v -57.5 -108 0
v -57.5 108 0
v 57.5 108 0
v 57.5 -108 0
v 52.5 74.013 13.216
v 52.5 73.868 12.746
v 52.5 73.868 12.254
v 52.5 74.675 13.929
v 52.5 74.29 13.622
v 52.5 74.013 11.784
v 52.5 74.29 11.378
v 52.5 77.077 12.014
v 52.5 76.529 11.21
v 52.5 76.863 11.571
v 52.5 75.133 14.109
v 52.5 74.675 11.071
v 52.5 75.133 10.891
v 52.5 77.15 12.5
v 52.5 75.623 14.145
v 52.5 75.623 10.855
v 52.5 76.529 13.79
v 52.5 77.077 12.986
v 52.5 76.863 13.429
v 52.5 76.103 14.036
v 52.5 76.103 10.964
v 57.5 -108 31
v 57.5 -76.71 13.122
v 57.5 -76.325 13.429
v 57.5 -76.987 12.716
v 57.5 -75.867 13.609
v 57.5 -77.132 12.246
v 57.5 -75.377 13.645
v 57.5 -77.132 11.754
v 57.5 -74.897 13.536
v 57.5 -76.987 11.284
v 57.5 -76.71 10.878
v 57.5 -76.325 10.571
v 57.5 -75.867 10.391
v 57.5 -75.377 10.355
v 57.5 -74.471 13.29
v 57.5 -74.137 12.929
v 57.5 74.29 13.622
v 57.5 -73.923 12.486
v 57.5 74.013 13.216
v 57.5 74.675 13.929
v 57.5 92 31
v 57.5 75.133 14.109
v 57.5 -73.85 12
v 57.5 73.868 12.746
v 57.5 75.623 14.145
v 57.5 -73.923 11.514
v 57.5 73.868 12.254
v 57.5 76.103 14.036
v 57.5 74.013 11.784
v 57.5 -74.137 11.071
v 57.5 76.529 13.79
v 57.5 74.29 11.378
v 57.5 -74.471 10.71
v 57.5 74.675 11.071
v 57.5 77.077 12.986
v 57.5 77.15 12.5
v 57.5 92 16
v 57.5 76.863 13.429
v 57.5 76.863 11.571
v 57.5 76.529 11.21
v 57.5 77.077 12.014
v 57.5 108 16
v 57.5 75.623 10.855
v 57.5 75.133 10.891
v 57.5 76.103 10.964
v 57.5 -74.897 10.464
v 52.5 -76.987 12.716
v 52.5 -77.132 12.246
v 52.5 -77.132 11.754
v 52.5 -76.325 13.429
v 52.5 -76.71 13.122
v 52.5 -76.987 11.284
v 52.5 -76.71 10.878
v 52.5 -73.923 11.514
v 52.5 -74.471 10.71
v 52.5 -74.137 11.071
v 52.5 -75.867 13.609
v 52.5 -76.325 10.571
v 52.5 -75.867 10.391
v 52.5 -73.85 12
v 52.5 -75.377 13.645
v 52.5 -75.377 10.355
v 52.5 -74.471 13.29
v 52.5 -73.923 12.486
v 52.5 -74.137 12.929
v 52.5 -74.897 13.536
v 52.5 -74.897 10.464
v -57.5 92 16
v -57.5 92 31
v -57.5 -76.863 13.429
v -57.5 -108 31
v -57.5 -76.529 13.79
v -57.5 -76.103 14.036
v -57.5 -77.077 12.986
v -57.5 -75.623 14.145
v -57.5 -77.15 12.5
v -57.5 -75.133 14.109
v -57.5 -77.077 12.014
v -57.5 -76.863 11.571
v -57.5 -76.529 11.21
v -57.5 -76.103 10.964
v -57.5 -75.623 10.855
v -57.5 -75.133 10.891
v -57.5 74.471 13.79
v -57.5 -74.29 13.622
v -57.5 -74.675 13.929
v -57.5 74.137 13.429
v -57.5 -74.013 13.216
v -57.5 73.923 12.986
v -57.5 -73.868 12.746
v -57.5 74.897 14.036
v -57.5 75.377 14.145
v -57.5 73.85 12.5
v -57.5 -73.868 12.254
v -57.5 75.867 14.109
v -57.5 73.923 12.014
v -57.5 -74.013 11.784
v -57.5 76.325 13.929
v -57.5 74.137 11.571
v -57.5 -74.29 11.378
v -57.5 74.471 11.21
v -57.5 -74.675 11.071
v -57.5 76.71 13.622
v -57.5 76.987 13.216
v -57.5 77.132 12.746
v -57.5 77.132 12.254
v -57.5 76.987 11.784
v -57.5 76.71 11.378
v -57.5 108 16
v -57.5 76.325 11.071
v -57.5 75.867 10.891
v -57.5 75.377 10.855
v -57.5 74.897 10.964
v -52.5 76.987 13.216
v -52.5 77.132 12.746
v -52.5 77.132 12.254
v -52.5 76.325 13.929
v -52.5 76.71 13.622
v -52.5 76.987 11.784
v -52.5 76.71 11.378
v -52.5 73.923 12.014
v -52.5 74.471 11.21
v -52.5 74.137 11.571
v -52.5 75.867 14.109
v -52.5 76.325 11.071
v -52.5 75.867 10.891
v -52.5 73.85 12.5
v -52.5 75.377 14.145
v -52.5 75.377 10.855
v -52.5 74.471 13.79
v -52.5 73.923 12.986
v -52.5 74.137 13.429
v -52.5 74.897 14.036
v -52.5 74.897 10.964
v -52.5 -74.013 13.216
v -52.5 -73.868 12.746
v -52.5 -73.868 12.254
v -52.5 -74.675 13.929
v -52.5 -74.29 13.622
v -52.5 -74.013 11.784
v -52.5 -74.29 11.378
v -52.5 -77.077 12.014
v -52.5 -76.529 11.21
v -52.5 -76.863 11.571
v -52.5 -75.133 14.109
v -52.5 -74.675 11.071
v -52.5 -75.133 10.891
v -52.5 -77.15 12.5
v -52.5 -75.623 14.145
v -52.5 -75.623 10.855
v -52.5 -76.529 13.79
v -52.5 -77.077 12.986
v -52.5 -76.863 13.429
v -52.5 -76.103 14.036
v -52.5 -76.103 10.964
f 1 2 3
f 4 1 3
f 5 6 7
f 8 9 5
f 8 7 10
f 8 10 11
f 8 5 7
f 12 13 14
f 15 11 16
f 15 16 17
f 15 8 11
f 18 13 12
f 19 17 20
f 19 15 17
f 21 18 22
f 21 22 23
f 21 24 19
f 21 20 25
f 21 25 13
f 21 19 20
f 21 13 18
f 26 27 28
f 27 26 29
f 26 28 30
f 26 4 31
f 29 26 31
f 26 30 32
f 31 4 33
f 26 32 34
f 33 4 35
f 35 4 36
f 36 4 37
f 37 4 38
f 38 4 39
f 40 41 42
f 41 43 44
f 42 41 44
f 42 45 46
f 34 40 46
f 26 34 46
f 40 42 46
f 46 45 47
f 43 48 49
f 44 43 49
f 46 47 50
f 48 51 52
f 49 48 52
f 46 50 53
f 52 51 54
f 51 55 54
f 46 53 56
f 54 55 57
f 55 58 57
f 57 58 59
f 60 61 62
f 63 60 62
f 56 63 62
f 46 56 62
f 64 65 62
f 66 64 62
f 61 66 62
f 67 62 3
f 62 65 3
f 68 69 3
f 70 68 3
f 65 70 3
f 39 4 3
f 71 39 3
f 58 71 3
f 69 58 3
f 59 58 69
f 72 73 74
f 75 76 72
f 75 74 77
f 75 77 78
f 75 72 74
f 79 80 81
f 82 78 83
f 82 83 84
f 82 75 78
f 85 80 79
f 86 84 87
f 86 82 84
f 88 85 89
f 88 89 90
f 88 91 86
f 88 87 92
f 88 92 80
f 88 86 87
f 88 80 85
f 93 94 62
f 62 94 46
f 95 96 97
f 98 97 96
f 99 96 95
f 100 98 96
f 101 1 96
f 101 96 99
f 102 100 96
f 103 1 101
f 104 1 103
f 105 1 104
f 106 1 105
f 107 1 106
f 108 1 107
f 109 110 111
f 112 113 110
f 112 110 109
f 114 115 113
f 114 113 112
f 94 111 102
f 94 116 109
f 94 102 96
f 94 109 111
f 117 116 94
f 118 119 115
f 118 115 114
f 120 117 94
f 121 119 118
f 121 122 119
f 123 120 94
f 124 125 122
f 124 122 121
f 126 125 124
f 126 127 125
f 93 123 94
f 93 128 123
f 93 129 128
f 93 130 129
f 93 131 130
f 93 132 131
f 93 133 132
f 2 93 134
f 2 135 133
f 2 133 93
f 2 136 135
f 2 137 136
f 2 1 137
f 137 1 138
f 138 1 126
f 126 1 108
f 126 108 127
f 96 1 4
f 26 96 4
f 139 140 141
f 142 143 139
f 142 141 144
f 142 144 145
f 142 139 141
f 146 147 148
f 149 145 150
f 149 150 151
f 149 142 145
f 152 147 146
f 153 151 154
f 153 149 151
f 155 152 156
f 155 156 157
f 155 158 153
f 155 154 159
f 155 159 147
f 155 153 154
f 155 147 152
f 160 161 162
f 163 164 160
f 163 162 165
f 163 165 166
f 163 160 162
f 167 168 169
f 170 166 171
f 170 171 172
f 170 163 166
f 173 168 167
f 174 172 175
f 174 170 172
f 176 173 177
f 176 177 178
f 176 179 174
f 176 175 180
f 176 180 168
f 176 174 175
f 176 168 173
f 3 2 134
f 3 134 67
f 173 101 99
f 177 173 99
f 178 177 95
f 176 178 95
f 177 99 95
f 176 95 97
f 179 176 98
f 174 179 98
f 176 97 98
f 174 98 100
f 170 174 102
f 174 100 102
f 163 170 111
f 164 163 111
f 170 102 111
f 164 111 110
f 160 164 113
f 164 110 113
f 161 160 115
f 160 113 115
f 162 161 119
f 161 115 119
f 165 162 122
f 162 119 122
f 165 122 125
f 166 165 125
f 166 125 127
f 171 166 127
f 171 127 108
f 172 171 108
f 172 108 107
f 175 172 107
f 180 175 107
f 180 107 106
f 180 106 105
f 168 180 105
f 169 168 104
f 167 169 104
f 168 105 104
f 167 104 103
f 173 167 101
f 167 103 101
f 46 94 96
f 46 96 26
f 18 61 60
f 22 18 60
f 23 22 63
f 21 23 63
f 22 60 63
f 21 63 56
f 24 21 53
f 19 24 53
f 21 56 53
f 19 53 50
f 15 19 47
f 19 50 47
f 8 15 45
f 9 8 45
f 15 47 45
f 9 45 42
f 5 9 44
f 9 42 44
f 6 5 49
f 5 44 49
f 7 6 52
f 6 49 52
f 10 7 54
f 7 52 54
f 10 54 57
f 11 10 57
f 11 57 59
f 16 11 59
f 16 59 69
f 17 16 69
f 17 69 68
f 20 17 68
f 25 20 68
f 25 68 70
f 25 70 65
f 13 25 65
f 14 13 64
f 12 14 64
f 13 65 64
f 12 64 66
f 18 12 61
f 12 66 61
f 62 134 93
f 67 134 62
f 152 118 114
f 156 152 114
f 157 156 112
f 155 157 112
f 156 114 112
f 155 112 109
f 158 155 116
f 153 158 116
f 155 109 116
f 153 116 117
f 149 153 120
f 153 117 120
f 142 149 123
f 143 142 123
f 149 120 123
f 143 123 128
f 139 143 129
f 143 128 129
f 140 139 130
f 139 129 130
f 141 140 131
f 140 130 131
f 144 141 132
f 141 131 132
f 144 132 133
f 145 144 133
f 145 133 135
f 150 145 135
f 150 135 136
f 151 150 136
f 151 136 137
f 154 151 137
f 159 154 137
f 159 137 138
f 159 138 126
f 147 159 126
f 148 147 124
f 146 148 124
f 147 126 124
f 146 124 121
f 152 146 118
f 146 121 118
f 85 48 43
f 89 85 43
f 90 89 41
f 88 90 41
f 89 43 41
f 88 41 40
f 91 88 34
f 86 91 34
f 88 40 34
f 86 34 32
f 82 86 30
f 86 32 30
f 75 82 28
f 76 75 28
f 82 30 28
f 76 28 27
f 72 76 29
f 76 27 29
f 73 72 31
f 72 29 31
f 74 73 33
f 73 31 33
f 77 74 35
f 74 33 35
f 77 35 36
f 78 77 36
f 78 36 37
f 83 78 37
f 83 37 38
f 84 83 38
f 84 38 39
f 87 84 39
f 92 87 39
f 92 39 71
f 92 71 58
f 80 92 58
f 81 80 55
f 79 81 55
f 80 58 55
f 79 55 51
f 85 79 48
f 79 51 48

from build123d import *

# Parameters (mm, degrees)
F0_W      = 115
F0_H      = 216
F1_DEPTH  = 31
F3_W      = 115
F3_H      = 16
F4_DEPTH  = 15
F6_R      = 1.65
F7_DEPTH  = 5
F9_R      = 1.65
F10_DEPTH = 5


with BuildPart() as f1:
    # F0 (on Top) → F1 (new body)
    with BuildSketch(Plane.XY):
        Rectangle(F0_W, F0_H)
    extrude(amount=F1_DEPTH)

    # F3 (on offset) → F4 (cut)
    with BuildSketch(Plane.XY.offset(31)):
        with Locations((0, 100)):
            Rectangle(F3_W, F3_H)
    extrude(amount=-F4_DEPTH, mode=Mode.SUBTRACT)

    # F6 (on offset) → F7 (cut)
    with BuildSketch(Plane.YZ.offset(57.5)):
        with Locations((-75.5, 12)):
            Circle(F6_R)
        with Locations((75.5, 12.5)):
            Circle(F6_R)
    extrude(amount=-F7_DEPTH, mode=Mode.SUBTRACT)

    # F9 (on offset) → F10 (cut)
    with BuildSketch(Plane(origin=(-57.5, 0, 0), x_dir=(0, -1, 0), z_dir=(-1, 0, 0))):
        with Locations((75.5, 12.5)):
            Circle(F9_R)
        with Locations((-75.5, 12.5)):
            Circle(F9_R)
    extrude(amount=-F10_DEPTH, mode=Mode.SUBTRACT)


solid = f1.part
